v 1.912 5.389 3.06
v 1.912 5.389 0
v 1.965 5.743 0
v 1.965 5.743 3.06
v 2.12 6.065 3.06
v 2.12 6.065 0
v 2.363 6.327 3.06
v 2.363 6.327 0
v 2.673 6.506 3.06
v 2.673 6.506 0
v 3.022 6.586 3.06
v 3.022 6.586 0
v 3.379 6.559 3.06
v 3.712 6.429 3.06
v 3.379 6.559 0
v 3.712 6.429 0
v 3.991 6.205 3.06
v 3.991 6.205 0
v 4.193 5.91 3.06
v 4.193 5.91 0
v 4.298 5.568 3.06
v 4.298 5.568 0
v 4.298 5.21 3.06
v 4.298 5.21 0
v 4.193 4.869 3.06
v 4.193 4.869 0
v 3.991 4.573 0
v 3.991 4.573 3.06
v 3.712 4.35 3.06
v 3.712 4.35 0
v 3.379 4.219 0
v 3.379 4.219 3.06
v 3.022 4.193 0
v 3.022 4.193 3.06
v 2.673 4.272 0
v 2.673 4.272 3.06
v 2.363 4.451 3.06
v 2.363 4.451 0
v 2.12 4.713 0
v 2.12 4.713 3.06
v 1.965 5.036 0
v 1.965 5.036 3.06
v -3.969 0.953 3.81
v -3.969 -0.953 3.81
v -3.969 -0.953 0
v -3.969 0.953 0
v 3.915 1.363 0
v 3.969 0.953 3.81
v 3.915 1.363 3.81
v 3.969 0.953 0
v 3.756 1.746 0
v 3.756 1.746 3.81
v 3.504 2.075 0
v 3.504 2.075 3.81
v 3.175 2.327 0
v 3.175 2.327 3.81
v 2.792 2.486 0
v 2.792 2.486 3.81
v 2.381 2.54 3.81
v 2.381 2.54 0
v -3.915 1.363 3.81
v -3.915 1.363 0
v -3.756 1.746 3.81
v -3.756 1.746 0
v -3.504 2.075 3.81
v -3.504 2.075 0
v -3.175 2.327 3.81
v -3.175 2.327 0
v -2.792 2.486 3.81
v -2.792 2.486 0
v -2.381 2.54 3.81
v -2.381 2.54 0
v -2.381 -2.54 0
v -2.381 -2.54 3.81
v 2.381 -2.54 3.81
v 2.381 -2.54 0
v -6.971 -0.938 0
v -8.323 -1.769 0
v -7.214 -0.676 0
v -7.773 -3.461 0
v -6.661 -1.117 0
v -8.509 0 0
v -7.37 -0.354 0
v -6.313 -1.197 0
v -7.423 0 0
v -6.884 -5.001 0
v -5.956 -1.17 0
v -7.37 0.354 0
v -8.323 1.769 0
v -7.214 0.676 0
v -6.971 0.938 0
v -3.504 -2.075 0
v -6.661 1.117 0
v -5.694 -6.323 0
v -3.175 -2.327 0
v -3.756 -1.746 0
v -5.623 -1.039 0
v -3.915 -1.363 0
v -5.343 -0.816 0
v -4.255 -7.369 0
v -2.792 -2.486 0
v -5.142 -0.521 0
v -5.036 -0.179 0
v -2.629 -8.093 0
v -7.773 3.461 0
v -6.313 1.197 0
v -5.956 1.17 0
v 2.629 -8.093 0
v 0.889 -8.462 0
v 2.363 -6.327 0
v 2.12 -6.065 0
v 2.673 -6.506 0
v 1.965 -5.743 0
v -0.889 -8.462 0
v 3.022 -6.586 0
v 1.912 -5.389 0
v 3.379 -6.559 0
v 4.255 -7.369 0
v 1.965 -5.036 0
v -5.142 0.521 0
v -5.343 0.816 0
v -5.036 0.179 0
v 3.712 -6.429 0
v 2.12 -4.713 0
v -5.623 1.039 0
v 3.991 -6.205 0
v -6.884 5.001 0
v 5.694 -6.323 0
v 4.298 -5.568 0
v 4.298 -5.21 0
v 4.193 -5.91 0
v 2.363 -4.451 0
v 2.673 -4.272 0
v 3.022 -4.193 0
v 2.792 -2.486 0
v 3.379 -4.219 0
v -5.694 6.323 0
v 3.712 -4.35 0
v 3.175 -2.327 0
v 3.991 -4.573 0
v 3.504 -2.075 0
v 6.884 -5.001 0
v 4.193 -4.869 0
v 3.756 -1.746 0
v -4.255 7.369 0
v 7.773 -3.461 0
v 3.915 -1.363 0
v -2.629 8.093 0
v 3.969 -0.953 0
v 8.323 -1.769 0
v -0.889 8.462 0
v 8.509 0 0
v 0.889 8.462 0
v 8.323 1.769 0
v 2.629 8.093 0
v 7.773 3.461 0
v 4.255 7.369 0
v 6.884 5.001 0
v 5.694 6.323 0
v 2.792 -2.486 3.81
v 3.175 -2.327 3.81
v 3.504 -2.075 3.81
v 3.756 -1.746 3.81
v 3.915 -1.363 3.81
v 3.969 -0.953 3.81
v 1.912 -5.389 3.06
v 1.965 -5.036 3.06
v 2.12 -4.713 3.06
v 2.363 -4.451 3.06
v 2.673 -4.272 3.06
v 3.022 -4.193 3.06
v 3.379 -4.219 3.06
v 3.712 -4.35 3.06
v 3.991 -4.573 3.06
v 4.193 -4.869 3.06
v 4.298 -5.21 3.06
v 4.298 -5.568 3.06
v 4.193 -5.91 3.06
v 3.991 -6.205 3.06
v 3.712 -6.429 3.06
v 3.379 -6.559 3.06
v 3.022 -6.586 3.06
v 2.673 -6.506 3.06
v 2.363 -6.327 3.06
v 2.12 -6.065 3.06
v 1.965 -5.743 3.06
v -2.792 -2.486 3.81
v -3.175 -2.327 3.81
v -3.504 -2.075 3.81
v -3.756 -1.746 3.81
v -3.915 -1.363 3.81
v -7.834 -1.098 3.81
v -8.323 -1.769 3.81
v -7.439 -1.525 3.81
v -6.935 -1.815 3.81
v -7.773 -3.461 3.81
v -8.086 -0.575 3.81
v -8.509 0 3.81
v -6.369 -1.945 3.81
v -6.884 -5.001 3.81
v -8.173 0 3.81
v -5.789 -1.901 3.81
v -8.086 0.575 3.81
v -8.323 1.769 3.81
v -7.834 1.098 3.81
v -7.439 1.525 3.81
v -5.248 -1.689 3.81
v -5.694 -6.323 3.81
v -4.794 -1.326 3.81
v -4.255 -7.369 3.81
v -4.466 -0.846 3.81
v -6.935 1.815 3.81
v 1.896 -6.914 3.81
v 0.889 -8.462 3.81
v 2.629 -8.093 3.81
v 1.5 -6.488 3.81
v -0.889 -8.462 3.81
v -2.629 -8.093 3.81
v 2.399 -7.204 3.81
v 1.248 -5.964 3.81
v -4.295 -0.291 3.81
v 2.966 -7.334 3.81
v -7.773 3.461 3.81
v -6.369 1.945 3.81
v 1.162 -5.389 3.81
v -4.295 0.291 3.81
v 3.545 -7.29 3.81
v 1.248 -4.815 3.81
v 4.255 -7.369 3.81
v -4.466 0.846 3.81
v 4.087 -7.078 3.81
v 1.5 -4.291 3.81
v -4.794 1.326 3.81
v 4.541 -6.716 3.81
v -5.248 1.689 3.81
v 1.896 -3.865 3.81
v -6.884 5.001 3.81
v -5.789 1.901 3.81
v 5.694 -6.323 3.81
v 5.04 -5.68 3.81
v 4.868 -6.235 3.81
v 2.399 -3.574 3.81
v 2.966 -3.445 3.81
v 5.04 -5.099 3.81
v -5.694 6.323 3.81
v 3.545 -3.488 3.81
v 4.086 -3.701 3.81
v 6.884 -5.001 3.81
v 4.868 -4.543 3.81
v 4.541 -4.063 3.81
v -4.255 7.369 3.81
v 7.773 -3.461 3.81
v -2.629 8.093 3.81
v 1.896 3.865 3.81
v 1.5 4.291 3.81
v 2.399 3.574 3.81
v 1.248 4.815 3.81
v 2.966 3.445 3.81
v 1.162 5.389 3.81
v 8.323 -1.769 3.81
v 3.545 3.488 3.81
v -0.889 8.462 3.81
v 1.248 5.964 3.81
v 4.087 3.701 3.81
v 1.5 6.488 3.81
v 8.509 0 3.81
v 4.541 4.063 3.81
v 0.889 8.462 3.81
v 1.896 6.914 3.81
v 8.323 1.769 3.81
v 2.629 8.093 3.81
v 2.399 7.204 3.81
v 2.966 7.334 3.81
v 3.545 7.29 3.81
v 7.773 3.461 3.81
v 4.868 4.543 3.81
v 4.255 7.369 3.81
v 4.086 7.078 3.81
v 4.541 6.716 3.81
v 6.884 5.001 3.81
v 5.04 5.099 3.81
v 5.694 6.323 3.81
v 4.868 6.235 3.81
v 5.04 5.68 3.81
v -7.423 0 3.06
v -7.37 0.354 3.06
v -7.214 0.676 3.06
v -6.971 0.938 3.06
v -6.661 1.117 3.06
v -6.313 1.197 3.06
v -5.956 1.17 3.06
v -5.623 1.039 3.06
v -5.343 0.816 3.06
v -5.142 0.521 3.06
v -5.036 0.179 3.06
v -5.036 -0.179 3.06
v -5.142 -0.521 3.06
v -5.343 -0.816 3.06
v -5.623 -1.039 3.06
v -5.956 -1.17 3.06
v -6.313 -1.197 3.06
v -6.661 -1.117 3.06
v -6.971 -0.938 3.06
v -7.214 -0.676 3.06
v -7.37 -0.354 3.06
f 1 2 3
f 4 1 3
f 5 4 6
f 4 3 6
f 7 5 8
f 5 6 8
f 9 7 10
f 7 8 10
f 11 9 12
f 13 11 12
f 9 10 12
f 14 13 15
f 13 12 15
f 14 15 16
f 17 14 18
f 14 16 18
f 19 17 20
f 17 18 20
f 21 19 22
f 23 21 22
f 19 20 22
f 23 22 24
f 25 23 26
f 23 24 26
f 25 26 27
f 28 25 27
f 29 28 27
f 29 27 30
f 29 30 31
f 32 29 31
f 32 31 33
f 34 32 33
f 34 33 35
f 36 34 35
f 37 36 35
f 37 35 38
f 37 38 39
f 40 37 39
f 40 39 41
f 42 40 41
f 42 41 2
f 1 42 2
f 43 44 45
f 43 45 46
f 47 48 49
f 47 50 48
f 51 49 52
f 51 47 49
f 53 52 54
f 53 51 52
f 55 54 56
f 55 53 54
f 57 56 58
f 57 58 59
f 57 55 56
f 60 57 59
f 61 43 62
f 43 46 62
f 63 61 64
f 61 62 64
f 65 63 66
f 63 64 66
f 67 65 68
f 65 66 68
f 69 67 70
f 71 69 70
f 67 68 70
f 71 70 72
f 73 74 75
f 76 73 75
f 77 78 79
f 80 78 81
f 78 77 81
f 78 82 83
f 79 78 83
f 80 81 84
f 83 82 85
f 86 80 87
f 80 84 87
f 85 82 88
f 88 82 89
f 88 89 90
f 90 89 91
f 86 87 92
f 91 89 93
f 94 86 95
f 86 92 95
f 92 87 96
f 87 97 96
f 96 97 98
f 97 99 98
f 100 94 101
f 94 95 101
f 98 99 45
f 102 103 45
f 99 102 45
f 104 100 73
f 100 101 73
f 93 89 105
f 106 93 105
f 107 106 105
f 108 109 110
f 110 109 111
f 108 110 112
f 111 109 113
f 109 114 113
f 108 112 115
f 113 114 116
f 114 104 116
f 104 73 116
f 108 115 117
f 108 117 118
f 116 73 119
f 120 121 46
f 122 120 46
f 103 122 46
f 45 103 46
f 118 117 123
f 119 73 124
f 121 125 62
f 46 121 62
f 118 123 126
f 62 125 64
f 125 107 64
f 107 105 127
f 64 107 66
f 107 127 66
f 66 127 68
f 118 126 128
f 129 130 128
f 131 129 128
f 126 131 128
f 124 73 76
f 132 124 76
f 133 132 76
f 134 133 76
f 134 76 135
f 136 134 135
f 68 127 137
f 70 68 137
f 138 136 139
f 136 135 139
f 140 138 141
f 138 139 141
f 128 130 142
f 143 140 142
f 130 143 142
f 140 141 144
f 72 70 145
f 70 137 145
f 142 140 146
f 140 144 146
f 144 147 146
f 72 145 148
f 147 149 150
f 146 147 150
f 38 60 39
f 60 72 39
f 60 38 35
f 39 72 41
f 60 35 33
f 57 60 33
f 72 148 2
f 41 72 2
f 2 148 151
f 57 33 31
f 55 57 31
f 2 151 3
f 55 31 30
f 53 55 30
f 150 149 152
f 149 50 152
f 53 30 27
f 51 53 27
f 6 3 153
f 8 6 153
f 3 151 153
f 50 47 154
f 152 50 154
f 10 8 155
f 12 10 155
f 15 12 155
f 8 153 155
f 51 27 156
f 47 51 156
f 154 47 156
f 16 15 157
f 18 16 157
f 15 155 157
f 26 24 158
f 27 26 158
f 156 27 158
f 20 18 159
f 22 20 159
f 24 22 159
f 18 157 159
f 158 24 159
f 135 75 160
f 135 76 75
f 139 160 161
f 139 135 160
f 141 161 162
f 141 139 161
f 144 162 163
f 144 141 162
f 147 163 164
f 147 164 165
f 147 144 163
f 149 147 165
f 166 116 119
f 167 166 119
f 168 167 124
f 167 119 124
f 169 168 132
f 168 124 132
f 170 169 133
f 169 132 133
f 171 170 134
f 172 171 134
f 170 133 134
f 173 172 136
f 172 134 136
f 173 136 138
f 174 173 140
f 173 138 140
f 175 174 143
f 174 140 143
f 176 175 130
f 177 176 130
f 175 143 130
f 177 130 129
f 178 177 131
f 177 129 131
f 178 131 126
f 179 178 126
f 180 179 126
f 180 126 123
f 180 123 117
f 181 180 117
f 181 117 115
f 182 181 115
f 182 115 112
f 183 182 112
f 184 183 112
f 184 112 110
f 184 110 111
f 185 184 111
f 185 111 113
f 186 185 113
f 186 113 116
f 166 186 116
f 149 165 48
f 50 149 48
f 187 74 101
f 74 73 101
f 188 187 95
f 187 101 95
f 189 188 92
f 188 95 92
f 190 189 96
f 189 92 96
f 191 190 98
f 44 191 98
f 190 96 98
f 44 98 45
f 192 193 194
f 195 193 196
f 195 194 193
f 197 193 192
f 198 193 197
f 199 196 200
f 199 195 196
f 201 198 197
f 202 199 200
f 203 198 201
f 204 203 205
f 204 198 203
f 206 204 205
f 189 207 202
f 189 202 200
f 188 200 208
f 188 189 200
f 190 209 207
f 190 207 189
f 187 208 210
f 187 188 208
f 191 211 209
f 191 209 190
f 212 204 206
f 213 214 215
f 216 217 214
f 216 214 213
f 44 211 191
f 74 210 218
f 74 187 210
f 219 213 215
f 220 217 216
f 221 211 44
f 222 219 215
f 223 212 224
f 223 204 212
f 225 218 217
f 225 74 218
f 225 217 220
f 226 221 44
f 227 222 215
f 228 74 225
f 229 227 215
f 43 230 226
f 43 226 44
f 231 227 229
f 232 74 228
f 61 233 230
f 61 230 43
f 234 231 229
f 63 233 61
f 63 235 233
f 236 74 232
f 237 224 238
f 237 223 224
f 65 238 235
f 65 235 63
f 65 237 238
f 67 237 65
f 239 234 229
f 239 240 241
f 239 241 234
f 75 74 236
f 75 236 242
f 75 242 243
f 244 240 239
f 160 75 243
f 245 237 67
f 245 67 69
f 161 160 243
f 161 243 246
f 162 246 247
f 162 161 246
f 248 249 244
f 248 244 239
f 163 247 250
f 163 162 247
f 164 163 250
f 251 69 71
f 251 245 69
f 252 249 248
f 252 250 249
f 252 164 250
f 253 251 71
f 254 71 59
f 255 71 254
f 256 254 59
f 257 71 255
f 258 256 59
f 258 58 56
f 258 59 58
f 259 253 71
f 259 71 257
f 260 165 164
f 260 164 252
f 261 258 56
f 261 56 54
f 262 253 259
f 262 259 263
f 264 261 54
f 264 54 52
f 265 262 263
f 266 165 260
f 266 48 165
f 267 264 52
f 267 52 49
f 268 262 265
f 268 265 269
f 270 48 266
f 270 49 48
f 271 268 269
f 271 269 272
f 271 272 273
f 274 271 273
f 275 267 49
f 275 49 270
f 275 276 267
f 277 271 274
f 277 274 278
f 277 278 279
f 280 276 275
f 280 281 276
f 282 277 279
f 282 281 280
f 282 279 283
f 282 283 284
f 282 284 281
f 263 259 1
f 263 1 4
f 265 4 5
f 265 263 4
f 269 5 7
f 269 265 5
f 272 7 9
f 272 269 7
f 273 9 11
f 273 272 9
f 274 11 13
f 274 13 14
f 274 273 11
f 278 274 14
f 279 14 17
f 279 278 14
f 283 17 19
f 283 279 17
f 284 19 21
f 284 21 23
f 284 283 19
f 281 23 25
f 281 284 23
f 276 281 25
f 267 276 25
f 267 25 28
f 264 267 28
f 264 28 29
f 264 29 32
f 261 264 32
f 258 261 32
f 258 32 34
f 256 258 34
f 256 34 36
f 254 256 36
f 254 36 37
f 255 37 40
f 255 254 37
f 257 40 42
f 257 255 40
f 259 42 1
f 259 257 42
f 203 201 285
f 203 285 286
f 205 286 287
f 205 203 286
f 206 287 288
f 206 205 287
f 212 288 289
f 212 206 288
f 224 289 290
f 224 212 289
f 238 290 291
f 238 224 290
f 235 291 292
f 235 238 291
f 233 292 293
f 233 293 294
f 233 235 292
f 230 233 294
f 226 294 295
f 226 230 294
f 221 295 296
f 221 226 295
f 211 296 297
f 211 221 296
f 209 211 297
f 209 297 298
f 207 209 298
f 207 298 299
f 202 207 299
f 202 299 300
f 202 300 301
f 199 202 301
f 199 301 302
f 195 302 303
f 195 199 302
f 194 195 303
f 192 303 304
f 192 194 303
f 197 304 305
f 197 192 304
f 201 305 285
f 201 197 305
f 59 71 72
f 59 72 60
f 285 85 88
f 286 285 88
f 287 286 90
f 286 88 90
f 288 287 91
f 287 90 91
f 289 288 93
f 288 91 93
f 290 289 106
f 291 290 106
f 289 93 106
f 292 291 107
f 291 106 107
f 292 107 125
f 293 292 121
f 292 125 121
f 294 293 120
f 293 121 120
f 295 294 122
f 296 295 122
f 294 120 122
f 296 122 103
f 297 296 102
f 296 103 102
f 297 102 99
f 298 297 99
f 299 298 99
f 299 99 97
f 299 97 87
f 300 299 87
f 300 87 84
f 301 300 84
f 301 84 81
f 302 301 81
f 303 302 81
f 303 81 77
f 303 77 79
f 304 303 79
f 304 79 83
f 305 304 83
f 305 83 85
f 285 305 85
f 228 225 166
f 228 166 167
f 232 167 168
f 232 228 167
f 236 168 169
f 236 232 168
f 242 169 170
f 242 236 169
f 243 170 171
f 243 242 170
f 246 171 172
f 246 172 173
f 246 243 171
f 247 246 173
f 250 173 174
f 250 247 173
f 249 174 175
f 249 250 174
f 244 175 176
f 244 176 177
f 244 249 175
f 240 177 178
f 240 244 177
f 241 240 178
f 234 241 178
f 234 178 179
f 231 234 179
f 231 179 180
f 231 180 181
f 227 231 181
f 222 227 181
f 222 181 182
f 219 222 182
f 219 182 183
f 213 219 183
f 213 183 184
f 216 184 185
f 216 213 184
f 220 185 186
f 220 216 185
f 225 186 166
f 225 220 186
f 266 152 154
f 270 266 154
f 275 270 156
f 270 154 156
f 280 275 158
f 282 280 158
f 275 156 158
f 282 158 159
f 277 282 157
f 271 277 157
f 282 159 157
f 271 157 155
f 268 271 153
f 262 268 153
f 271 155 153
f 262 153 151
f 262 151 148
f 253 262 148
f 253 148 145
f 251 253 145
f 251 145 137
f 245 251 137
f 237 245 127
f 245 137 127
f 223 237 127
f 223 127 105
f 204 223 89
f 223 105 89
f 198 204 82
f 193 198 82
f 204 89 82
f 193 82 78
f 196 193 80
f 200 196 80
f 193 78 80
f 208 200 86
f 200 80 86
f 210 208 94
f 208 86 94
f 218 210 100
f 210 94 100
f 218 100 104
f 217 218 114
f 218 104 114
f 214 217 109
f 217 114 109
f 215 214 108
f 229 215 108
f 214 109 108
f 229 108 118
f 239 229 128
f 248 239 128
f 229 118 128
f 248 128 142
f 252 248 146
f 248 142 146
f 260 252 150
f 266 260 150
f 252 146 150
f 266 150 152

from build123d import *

# Parameters (mm, degrees)
SKETCH1_R            = 8.509
BOSS_EXTRUDE1_DEPTH  = 3.81
SKETCH3_W            = 7.9375
SKETCH3_H            = 5.08
CUT_EXTRUDE2_DEPTH   = 3.81
M2_CLEARANCE_HOLE1_D = 2.4
FILLET1_R            = 1.5875
CHAMFER1_SIZE        = 0.75


with BuildPart() as part:
    # Sketch1 → Boss-Extrude1 (new body)
    with BuildSketch(Plane.XY):
        Circle(SKETCH1_R)
    extrude(amount=BOSS_EXTRUDE1_DEPTH)

    # Sketch3 → Cut-Extrude2 (cut)
    with BuildSketch(Plane.XY.offset(3.81)):
        Rectangle(SKETCH3_W, SKETCH3_H)
    extrude(amount=-CUT_EXTRUDE2_DEPTH, mode=Mode.SUBTRACT)

    # M2 Clearance Hole1 (through all)
    with Locations(Plane.XY.offset(3.81)):
        with Locations((-6.223, 0), (3.1115, 5.389276088), (3.1115, -5.389276088)):
            Hole(M2_CLEARANCE_HOLE1_D / 2)

    # Fillet1
    fillet1_edges = [part.edges().sort_by_distance(p)[0] for p in [
        (3.96875, 2.54, 1.905),
        (3.96875, -2.54, 1.905),
        (-3.96875, -2.54, 1.905),
        (-3.96875, 2.54, 1.905),
    ]]
    fillet(fillet1_edges, radius=FILLET1_R)

    # Chamfer1
    chamfer1_edges = [part.edges().sort_by_distance(p)[0] for p in [
        (4.3115, -5.389276088, 3.81),
        (4.3115, 5.389276088, 3.81),
        (-5.023, 0, 3.81),
    ]]
    chamfer(chamfer1_edges, length=CHAMFER1_SIZE)


solid = part.part
